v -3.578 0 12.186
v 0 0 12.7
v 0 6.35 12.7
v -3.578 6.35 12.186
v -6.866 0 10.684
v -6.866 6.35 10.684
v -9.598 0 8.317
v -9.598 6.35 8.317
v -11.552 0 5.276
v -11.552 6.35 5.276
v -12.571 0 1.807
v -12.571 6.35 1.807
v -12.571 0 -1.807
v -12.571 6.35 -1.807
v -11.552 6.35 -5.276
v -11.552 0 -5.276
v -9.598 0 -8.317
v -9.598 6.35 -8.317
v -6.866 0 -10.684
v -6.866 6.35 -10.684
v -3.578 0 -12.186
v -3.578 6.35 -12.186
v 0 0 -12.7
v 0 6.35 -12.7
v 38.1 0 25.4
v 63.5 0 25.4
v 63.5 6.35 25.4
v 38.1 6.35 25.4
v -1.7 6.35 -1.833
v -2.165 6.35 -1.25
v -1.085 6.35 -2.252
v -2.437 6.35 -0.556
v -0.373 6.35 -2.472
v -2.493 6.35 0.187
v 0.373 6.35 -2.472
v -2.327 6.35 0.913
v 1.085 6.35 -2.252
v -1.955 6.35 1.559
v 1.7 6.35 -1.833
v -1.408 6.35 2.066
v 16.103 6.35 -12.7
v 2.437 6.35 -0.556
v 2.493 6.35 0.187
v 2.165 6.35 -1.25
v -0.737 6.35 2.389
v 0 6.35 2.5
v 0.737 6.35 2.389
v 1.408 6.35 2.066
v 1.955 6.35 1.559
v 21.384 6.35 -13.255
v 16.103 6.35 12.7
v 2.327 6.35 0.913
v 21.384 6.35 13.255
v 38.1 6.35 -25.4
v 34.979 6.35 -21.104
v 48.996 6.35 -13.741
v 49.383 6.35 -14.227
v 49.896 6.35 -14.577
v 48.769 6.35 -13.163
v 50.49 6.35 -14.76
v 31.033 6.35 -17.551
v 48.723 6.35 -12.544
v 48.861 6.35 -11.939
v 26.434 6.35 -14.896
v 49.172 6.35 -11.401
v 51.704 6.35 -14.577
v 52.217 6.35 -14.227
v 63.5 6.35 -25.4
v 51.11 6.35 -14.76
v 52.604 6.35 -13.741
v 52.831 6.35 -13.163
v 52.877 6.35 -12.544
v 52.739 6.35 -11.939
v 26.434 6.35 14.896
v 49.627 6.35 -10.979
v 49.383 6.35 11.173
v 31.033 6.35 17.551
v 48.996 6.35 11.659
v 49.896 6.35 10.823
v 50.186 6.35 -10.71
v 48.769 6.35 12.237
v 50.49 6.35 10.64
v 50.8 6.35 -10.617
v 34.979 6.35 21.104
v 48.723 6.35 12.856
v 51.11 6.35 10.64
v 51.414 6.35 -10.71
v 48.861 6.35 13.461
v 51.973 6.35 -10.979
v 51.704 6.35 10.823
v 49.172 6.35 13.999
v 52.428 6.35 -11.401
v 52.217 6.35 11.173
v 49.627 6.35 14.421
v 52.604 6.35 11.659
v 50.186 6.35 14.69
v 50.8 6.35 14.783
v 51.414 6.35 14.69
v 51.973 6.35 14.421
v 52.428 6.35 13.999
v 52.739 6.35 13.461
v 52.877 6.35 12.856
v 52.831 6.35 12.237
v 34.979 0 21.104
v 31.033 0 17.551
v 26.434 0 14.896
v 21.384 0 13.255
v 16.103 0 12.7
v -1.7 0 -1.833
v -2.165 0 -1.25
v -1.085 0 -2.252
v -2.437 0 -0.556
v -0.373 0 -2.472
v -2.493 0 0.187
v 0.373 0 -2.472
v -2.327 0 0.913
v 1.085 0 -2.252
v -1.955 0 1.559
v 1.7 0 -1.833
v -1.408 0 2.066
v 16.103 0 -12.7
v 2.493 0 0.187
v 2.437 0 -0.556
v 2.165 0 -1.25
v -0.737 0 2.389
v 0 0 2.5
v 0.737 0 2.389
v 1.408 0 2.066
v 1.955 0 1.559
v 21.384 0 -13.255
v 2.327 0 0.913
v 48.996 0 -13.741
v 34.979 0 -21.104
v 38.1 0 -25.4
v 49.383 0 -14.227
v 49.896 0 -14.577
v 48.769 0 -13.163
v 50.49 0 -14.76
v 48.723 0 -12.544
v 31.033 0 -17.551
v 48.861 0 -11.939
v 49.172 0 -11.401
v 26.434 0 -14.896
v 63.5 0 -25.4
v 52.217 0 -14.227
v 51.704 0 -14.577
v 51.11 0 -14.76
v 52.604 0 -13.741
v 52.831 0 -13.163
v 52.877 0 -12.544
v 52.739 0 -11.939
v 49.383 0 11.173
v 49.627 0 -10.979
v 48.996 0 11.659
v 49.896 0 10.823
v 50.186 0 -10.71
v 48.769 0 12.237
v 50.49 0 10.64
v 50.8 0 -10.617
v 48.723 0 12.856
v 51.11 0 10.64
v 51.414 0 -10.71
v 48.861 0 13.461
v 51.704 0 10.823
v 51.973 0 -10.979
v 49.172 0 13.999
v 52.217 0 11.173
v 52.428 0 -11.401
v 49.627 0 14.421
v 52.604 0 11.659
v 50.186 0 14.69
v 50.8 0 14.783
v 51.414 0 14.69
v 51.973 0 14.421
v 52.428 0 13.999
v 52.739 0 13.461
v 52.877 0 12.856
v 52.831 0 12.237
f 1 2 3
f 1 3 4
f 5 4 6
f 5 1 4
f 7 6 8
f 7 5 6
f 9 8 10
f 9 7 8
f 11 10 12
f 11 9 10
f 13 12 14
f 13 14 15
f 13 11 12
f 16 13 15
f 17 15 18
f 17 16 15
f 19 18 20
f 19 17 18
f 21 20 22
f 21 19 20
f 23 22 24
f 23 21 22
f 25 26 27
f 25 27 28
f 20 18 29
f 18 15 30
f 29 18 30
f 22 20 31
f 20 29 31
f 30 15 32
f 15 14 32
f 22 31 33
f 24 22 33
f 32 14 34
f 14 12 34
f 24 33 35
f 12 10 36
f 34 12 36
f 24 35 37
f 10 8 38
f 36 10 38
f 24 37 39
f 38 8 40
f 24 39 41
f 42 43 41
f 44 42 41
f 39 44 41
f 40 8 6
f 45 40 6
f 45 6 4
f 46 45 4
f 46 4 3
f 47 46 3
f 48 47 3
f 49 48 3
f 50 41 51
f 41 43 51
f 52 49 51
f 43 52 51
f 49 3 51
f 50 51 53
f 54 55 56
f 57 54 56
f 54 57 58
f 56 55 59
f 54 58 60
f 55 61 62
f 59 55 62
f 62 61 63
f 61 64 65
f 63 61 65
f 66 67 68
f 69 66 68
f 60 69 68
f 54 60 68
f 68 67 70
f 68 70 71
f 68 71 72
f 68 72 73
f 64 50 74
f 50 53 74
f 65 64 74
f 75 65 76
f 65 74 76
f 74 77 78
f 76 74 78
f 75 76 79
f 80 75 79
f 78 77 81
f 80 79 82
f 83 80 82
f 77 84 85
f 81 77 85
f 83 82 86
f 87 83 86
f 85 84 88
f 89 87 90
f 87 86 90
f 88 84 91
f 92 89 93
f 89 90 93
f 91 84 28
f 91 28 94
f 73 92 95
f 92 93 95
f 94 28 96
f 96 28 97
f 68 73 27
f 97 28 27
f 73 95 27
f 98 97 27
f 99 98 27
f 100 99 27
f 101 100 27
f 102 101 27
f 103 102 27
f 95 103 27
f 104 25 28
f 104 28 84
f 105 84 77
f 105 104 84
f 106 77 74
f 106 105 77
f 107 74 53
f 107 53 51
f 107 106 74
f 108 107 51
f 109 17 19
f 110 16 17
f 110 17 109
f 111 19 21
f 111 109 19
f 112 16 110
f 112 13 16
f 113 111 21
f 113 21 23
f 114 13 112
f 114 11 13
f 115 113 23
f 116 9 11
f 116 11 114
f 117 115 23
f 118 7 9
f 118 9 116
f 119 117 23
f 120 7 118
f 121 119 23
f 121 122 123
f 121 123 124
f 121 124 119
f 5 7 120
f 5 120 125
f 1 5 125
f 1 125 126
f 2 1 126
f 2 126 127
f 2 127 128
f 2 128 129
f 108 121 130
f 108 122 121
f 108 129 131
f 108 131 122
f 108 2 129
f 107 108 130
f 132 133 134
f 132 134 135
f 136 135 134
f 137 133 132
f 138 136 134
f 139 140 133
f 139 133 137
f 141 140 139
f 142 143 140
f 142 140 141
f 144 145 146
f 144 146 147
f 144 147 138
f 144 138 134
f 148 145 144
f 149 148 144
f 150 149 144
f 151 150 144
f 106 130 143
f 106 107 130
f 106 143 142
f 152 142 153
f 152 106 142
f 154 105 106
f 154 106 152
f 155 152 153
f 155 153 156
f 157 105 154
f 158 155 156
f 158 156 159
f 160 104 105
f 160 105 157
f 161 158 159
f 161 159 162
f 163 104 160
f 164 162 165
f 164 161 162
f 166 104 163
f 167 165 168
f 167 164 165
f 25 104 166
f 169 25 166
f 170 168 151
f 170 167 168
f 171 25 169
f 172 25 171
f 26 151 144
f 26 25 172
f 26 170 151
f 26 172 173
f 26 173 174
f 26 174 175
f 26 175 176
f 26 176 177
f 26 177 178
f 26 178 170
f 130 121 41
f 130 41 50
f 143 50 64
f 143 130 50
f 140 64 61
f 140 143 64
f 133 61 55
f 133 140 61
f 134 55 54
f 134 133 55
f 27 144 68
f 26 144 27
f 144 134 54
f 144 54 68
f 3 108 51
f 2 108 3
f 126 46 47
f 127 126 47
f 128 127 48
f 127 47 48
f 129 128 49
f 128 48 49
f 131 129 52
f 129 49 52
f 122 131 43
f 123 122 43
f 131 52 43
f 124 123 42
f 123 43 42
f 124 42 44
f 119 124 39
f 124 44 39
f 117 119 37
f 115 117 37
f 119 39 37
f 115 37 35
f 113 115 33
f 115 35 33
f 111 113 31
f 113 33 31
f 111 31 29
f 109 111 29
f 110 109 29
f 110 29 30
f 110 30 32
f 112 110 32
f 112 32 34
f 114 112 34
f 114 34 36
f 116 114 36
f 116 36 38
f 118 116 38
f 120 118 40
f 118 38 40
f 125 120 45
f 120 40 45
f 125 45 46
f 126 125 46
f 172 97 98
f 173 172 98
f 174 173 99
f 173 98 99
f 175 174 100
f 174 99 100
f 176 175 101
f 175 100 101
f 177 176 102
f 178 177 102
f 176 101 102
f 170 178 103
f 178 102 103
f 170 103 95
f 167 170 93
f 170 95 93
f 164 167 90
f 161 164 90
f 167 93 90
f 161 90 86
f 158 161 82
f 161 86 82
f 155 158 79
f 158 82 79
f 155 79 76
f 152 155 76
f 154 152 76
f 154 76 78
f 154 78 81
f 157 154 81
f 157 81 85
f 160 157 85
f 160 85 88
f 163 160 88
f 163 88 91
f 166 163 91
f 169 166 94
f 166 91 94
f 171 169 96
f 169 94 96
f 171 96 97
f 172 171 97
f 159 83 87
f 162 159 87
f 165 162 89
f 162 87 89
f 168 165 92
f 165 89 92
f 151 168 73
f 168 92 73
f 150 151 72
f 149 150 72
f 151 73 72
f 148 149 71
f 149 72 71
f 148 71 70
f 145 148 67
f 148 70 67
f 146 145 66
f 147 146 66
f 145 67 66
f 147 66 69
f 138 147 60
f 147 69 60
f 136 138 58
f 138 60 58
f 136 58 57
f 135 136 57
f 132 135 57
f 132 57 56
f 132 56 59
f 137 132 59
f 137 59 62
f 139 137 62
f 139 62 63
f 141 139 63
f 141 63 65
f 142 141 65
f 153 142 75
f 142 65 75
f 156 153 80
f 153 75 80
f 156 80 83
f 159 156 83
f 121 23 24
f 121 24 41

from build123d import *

# Parameters (mm, degrees)
BOSS_EXTRUDE1_DEPTH = 6.35
FILLET1_R           = 25.4
SKETCH2_R           = 2.5
CUT_EXTRUDE1_DEPTH  = 6.35
SKETCH3_R           = 2.0828
CUT_EXTRUDE2_DEPTH  = 6.35


with BuildPart() as part:
    # Sketch1 → Boss-Extrude1 (new body)
    with BuildSketch(Plane(origin=(0, 0, 0), x_dir=(1, 0, 0), z_dir=(0, 1, 0))):
        with BuildLine():
            Line((0, 12.7), (38.1, 12.7))
            Line((38.1, 12.7), (38.1, 25.4))
            Line((38.1, 25.4), (63.5, 25.4))
            Line((63.5, 25.4), (63.5, -25.4))
            Line((63.5, -25.4), (38.1, -25.4))
            Line((38.1, -25.4), (38.1, -12.7))
            Line((38.1, -12.7), (0, -12.7))
            ThreePointArc((0, -12.7), (-12.7, 0), (0, 12.7))
        make_face()
    extrude(amount=BOSS_EXTRUDE1_DEPTH)

    # Fillet1
    # the kernel refuses this fillet: 25.4 mm, written as the material it adds along each edge
    with BuildSketch(Plane(origin=(38.1, 0, 12.7), x_dir=(0, 0, 1), z_dir=(0, 1, 0))) as fillet1_piece_1:
        with BuildLine():
            CenterArc((25.4, -21.997045256), FILLET1_R, 120, 60)
            Line((0, -21.997045256), (-0.508, -21.997045256))
            Line((-0.508, -21.997045256), (-0.508, 0))
            Line((-0.508, 0), (0, 0.508))
            ThreePointArc((0, 0.508), (6.35, 0.508), (12.446, 0.439940905))
            Line((12.446, 0.439940905), (12.7, 0))
        make_face()
    extrude(amount=6.35)
    with BuildSketch(Plane(origin=(38.1, 0, -12.7), x_dir=(-1, 0, 0), z_dir=(0, 1, 0))) as fillet1_piece_2:
        with BuildLine():
            CenterArc((21.997045256, -25.4), FILLET1_R, 90, 60)
            Line((0, -12.7), (-0.439940905, -12.446))
            ThreePointArc((-0.439940905, -12.446), (-0.508, -6.35), (-0.508, 0))
            Line((-0.508, 0), (0, 0.508))
            Line((0, 0.508), (21.997045256, 0.508))
            Line((21.997045256, 0.508), (21.997045256, 0))
        make_face()
    extrude(amount=6.35)

    # Sketch2 → Cut-Extrude1 (cut)
    with BuildSketch(Plane(origin=(0, 6.35, 0), x_dir=(1, 0, 0), z_dir=(0, 1, 0))):
        with Locations(Location((0, 0, 0), (0, 0, 270))):
            Circle(SKETCH2_R)
    extrude(amount=-CUT_EXTRUDE1_DEPTH, mode=Mode.SUBTRACT)

    # Sketch3 → Cut-Extrude2 (cut)
    with BuildSketch(Plane(origin=(0, 6.35, 0), x_dir=(1, 0, 0), z_dir=(0, 1, 0))):
        with Locations(Location((50.8, 12.7, 0), (0, 0, 270))):
            Circle(SKETCH3_R)
        with Locations(Location((50.8, -12.7, 0), (0, 0, 270))):
            Circle(SKETCH3_R)
    extrude(amount=-CUT_EXTRUDE2_DEPTH, mode=Mode.SUBTRACT)


solid = part.part
